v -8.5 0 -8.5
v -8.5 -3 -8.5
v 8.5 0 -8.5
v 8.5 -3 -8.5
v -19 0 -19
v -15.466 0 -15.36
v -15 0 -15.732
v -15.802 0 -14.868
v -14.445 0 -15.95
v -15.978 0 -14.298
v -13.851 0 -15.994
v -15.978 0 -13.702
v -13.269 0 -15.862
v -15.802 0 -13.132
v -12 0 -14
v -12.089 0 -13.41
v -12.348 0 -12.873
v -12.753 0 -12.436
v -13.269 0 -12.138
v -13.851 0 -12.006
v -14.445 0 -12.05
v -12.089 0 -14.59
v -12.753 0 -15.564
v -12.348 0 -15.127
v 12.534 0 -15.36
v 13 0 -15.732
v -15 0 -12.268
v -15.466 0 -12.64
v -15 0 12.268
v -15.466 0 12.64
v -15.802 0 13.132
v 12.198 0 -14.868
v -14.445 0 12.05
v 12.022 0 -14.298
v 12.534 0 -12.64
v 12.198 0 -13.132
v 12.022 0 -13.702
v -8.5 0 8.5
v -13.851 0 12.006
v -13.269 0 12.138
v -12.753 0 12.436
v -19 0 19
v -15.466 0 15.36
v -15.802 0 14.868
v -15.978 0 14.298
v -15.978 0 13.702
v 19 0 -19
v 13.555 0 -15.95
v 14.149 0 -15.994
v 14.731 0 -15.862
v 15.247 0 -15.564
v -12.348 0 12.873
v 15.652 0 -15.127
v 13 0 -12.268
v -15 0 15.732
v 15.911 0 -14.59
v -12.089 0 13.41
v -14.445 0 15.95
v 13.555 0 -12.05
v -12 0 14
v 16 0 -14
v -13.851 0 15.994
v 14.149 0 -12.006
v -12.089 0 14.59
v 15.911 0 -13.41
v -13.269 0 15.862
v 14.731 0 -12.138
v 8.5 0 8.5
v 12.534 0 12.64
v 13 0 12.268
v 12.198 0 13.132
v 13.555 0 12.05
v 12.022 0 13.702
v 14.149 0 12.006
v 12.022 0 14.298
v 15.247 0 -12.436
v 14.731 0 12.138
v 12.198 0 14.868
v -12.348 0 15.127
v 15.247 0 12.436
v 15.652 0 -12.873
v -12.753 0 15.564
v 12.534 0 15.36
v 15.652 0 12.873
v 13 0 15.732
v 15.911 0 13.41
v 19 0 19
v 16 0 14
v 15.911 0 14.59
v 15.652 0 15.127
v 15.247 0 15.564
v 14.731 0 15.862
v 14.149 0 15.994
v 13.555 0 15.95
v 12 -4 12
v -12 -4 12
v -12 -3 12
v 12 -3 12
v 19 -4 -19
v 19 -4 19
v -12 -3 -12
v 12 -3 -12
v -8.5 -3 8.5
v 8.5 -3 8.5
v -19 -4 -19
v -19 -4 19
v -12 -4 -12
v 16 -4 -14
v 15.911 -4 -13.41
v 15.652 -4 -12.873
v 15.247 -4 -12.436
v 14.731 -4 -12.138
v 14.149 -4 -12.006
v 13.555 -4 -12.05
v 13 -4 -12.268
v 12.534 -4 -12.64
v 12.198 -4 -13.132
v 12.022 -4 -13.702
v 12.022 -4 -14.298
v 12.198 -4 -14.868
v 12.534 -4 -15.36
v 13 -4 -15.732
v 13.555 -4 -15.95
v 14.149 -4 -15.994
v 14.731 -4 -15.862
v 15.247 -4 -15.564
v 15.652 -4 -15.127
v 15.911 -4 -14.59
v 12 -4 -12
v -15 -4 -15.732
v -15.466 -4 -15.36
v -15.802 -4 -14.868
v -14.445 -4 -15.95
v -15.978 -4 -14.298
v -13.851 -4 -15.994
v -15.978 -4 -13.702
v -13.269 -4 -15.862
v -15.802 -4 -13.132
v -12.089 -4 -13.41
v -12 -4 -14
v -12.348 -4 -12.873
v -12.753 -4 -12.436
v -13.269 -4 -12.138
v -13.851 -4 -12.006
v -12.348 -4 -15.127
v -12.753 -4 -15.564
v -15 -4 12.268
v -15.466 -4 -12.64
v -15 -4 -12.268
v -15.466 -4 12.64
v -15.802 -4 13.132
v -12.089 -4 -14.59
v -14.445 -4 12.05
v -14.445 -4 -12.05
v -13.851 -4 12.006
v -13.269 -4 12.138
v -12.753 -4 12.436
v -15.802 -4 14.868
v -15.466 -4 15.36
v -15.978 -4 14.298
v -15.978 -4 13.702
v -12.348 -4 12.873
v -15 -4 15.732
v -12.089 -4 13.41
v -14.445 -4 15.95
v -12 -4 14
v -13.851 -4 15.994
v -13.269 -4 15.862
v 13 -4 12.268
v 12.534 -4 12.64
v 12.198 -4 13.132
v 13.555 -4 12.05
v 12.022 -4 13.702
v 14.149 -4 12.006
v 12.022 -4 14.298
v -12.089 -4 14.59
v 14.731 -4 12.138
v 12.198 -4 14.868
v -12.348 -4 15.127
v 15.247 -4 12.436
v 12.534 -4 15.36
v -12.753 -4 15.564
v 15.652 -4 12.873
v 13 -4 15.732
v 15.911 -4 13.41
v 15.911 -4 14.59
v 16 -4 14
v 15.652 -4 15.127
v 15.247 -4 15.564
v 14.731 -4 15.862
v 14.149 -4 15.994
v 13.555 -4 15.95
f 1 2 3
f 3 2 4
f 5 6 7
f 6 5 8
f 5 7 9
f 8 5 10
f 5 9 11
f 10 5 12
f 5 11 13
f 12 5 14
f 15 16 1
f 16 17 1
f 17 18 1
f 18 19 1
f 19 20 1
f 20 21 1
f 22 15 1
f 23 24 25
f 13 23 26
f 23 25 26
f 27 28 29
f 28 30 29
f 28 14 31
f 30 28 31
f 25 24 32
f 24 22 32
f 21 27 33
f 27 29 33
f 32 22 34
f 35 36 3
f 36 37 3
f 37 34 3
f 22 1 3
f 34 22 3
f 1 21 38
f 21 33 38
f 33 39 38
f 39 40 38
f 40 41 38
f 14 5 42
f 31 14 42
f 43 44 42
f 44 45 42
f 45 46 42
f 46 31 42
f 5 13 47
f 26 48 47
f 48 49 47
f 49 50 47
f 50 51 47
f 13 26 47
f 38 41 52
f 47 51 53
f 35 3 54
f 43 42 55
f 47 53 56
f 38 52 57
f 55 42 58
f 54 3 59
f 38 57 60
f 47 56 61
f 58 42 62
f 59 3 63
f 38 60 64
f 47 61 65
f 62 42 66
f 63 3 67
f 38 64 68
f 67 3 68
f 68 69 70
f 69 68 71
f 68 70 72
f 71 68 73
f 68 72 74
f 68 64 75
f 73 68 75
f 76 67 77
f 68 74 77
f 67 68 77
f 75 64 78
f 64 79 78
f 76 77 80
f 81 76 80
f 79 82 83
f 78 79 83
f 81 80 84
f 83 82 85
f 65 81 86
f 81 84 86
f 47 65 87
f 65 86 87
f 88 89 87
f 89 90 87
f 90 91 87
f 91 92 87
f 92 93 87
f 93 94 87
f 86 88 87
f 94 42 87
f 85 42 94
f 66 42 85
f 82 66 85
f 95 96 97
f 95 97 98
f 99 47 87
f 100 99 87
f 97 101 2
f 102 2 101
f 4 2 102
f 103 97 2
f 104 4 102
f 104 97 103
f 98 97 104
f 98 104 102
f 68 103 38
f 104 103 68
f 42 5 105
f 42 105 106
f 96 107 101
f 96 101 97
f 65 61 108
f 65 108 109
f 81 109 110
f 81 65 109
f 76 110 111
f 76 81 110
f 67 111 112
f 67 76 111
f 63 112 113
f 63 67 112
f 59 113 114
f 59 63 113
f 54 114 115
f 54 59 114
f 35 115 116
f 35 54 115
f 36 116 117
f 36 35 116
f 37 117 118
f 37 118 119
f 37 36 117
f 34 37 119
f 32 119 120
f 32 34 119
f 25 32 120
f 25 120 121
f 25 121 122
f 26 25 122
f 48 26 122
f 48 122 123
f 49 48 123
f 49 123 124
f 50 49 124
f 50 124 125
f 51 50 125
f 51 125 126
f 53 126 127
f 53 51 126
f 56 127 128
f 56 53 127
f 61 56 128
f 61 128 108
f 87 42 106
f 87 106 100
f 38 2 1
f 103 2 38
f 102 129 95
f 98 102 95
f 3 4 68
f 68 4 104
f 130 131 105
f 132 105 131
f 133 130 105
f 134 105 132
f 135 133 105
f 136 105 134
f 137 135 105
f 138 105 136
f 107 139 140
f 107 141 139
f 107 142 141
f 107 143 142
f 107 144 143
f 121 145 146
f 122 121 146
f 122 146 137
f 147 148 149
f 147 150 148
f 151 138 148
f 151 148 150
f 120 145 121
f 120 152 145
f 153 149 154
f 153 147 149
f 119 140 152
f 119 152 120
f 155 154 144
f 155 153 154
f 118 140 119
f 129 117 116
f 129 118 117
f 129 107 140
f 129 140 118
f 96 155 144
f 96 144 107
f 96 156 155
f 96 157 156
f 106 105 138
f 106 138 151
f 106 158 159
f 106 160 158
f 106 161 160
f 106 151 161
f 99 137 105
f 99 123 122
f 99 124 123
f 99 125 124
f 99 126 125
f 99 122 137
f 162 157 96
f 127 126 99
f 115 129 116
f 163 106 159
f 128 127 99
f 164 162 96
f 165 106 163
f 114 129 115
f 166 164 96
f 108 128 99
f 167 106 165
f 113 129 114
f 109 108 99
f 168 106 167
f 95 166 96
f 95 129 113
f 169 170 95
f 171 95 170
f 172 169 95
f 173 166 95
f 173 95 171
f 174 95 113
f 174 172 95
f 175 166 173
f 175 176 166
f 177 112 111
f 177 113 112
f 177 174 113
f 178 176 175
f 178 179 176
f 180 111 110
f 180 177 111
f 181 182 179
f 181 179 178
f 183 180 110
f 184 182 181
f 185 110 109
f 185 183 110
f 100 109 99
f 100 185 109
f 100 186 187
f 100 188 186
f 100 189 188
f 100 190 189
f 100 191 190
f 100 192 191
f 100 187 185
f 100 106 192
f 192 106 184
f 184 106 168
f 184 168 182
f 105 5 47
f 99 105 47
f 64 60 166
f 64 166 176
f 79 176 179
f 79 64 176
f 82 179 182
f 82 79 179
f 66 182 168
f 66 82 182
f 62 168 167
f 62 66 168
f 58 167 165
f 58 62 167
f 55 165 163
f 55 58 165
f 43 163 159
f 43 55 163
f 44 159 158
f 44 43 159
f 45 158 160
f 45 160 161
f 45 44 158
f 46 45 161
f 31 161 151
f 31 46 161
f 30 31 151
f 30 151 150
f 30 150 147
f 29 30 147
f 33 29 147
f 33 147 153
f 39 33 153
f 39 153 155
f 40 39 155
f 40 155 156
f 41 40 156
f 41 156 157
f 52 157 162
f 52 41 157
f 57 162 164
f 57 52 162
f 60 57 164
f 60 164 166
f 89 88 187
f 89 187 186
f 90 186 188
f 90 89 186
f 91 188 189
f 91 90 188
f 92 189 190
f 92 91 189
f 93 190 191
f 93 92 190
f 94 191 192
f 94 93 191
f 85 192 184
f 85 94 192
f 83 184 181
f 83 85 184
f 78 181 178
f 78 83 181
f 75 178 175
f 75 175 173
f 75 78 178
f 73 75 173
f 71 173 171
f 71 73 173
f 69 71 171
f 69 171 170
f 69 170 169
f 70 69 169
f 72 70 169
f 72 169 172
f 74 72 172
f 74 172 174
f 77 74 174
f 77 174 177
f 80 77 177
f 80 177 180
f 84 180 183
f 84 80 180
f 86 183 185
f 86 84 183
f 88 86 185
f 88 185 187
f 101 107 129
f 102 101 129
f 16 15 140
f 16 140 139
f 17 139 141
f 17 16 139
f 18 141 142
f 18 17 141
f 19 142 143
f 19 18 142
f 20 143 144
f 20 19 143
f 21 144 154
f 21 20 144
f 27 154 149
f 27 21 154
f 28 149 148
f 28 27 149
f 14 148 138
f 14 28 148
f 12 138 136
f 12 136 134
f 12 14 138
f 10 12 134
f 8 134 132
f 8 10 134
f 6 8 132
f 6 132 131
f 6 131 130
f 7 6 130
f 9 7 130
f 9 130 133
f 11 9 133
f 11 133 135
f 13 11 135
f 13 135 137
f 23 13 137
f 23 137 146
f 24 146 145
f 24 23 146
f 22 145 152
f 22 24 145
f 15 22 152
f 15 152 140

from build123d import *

# Parameters (mm, degrees)
SKETCH_W        = 38
SKETCH_H        = 38
SKETCH_R        = 2
PAD_DEPTH       = 4
SKETCH001_W     = 24
SKETCH001_H     = 24
POCKET_DEPTH    = 1
SKETCH002_W     = 17
SKETCH002_H     = 17
POCKET001_DEPTH = 3.001


with BuildPart() as part:
    # Sketch → Pad (new body)
    with BuildSketch(Plane.XZ):
        Rectangle(SKETCH_W, SKETCH_H)
        with Locations((-14, 14)):
            Circle(SKETCH_R, mode=Mode.SUBTRACT)
        with Locations((14, 14)):
            Circle(SKETCH_R, mode=Mode.SUBTRACT)
        with Locations((14, -14)):
            Circle(SKETCH_R, mode=Mode.SUBTRACT)
        with Locations((-14, -14)):
            Circle(SKETCH_R, mode=Mode.SUBTRACT)
    extrude(amount=PAD_DEPTH)

    # Sketch001 (on Face10 of Pad) → Pocket (cut)
    with BuildSketch(Plane.XZ.offset(4)):
        Rectangle(SKETCH001_W, SKETCH001_H)
    extrude(amount=-POCKET_DEPTH, mode=Mode.SUBTRACT)

    # Sketch002 (on Face15 of Pocket) → Pocket001 (cut, through all)
    with BuildSketch(Plane.XZ.offset(3)):
        Rectangle(SKETCH002_W, SKETCH002_H)
    extrude(amount=-POCKET001_DEPTH, mode=Mode.SUBTRACT)


solid = part.part
